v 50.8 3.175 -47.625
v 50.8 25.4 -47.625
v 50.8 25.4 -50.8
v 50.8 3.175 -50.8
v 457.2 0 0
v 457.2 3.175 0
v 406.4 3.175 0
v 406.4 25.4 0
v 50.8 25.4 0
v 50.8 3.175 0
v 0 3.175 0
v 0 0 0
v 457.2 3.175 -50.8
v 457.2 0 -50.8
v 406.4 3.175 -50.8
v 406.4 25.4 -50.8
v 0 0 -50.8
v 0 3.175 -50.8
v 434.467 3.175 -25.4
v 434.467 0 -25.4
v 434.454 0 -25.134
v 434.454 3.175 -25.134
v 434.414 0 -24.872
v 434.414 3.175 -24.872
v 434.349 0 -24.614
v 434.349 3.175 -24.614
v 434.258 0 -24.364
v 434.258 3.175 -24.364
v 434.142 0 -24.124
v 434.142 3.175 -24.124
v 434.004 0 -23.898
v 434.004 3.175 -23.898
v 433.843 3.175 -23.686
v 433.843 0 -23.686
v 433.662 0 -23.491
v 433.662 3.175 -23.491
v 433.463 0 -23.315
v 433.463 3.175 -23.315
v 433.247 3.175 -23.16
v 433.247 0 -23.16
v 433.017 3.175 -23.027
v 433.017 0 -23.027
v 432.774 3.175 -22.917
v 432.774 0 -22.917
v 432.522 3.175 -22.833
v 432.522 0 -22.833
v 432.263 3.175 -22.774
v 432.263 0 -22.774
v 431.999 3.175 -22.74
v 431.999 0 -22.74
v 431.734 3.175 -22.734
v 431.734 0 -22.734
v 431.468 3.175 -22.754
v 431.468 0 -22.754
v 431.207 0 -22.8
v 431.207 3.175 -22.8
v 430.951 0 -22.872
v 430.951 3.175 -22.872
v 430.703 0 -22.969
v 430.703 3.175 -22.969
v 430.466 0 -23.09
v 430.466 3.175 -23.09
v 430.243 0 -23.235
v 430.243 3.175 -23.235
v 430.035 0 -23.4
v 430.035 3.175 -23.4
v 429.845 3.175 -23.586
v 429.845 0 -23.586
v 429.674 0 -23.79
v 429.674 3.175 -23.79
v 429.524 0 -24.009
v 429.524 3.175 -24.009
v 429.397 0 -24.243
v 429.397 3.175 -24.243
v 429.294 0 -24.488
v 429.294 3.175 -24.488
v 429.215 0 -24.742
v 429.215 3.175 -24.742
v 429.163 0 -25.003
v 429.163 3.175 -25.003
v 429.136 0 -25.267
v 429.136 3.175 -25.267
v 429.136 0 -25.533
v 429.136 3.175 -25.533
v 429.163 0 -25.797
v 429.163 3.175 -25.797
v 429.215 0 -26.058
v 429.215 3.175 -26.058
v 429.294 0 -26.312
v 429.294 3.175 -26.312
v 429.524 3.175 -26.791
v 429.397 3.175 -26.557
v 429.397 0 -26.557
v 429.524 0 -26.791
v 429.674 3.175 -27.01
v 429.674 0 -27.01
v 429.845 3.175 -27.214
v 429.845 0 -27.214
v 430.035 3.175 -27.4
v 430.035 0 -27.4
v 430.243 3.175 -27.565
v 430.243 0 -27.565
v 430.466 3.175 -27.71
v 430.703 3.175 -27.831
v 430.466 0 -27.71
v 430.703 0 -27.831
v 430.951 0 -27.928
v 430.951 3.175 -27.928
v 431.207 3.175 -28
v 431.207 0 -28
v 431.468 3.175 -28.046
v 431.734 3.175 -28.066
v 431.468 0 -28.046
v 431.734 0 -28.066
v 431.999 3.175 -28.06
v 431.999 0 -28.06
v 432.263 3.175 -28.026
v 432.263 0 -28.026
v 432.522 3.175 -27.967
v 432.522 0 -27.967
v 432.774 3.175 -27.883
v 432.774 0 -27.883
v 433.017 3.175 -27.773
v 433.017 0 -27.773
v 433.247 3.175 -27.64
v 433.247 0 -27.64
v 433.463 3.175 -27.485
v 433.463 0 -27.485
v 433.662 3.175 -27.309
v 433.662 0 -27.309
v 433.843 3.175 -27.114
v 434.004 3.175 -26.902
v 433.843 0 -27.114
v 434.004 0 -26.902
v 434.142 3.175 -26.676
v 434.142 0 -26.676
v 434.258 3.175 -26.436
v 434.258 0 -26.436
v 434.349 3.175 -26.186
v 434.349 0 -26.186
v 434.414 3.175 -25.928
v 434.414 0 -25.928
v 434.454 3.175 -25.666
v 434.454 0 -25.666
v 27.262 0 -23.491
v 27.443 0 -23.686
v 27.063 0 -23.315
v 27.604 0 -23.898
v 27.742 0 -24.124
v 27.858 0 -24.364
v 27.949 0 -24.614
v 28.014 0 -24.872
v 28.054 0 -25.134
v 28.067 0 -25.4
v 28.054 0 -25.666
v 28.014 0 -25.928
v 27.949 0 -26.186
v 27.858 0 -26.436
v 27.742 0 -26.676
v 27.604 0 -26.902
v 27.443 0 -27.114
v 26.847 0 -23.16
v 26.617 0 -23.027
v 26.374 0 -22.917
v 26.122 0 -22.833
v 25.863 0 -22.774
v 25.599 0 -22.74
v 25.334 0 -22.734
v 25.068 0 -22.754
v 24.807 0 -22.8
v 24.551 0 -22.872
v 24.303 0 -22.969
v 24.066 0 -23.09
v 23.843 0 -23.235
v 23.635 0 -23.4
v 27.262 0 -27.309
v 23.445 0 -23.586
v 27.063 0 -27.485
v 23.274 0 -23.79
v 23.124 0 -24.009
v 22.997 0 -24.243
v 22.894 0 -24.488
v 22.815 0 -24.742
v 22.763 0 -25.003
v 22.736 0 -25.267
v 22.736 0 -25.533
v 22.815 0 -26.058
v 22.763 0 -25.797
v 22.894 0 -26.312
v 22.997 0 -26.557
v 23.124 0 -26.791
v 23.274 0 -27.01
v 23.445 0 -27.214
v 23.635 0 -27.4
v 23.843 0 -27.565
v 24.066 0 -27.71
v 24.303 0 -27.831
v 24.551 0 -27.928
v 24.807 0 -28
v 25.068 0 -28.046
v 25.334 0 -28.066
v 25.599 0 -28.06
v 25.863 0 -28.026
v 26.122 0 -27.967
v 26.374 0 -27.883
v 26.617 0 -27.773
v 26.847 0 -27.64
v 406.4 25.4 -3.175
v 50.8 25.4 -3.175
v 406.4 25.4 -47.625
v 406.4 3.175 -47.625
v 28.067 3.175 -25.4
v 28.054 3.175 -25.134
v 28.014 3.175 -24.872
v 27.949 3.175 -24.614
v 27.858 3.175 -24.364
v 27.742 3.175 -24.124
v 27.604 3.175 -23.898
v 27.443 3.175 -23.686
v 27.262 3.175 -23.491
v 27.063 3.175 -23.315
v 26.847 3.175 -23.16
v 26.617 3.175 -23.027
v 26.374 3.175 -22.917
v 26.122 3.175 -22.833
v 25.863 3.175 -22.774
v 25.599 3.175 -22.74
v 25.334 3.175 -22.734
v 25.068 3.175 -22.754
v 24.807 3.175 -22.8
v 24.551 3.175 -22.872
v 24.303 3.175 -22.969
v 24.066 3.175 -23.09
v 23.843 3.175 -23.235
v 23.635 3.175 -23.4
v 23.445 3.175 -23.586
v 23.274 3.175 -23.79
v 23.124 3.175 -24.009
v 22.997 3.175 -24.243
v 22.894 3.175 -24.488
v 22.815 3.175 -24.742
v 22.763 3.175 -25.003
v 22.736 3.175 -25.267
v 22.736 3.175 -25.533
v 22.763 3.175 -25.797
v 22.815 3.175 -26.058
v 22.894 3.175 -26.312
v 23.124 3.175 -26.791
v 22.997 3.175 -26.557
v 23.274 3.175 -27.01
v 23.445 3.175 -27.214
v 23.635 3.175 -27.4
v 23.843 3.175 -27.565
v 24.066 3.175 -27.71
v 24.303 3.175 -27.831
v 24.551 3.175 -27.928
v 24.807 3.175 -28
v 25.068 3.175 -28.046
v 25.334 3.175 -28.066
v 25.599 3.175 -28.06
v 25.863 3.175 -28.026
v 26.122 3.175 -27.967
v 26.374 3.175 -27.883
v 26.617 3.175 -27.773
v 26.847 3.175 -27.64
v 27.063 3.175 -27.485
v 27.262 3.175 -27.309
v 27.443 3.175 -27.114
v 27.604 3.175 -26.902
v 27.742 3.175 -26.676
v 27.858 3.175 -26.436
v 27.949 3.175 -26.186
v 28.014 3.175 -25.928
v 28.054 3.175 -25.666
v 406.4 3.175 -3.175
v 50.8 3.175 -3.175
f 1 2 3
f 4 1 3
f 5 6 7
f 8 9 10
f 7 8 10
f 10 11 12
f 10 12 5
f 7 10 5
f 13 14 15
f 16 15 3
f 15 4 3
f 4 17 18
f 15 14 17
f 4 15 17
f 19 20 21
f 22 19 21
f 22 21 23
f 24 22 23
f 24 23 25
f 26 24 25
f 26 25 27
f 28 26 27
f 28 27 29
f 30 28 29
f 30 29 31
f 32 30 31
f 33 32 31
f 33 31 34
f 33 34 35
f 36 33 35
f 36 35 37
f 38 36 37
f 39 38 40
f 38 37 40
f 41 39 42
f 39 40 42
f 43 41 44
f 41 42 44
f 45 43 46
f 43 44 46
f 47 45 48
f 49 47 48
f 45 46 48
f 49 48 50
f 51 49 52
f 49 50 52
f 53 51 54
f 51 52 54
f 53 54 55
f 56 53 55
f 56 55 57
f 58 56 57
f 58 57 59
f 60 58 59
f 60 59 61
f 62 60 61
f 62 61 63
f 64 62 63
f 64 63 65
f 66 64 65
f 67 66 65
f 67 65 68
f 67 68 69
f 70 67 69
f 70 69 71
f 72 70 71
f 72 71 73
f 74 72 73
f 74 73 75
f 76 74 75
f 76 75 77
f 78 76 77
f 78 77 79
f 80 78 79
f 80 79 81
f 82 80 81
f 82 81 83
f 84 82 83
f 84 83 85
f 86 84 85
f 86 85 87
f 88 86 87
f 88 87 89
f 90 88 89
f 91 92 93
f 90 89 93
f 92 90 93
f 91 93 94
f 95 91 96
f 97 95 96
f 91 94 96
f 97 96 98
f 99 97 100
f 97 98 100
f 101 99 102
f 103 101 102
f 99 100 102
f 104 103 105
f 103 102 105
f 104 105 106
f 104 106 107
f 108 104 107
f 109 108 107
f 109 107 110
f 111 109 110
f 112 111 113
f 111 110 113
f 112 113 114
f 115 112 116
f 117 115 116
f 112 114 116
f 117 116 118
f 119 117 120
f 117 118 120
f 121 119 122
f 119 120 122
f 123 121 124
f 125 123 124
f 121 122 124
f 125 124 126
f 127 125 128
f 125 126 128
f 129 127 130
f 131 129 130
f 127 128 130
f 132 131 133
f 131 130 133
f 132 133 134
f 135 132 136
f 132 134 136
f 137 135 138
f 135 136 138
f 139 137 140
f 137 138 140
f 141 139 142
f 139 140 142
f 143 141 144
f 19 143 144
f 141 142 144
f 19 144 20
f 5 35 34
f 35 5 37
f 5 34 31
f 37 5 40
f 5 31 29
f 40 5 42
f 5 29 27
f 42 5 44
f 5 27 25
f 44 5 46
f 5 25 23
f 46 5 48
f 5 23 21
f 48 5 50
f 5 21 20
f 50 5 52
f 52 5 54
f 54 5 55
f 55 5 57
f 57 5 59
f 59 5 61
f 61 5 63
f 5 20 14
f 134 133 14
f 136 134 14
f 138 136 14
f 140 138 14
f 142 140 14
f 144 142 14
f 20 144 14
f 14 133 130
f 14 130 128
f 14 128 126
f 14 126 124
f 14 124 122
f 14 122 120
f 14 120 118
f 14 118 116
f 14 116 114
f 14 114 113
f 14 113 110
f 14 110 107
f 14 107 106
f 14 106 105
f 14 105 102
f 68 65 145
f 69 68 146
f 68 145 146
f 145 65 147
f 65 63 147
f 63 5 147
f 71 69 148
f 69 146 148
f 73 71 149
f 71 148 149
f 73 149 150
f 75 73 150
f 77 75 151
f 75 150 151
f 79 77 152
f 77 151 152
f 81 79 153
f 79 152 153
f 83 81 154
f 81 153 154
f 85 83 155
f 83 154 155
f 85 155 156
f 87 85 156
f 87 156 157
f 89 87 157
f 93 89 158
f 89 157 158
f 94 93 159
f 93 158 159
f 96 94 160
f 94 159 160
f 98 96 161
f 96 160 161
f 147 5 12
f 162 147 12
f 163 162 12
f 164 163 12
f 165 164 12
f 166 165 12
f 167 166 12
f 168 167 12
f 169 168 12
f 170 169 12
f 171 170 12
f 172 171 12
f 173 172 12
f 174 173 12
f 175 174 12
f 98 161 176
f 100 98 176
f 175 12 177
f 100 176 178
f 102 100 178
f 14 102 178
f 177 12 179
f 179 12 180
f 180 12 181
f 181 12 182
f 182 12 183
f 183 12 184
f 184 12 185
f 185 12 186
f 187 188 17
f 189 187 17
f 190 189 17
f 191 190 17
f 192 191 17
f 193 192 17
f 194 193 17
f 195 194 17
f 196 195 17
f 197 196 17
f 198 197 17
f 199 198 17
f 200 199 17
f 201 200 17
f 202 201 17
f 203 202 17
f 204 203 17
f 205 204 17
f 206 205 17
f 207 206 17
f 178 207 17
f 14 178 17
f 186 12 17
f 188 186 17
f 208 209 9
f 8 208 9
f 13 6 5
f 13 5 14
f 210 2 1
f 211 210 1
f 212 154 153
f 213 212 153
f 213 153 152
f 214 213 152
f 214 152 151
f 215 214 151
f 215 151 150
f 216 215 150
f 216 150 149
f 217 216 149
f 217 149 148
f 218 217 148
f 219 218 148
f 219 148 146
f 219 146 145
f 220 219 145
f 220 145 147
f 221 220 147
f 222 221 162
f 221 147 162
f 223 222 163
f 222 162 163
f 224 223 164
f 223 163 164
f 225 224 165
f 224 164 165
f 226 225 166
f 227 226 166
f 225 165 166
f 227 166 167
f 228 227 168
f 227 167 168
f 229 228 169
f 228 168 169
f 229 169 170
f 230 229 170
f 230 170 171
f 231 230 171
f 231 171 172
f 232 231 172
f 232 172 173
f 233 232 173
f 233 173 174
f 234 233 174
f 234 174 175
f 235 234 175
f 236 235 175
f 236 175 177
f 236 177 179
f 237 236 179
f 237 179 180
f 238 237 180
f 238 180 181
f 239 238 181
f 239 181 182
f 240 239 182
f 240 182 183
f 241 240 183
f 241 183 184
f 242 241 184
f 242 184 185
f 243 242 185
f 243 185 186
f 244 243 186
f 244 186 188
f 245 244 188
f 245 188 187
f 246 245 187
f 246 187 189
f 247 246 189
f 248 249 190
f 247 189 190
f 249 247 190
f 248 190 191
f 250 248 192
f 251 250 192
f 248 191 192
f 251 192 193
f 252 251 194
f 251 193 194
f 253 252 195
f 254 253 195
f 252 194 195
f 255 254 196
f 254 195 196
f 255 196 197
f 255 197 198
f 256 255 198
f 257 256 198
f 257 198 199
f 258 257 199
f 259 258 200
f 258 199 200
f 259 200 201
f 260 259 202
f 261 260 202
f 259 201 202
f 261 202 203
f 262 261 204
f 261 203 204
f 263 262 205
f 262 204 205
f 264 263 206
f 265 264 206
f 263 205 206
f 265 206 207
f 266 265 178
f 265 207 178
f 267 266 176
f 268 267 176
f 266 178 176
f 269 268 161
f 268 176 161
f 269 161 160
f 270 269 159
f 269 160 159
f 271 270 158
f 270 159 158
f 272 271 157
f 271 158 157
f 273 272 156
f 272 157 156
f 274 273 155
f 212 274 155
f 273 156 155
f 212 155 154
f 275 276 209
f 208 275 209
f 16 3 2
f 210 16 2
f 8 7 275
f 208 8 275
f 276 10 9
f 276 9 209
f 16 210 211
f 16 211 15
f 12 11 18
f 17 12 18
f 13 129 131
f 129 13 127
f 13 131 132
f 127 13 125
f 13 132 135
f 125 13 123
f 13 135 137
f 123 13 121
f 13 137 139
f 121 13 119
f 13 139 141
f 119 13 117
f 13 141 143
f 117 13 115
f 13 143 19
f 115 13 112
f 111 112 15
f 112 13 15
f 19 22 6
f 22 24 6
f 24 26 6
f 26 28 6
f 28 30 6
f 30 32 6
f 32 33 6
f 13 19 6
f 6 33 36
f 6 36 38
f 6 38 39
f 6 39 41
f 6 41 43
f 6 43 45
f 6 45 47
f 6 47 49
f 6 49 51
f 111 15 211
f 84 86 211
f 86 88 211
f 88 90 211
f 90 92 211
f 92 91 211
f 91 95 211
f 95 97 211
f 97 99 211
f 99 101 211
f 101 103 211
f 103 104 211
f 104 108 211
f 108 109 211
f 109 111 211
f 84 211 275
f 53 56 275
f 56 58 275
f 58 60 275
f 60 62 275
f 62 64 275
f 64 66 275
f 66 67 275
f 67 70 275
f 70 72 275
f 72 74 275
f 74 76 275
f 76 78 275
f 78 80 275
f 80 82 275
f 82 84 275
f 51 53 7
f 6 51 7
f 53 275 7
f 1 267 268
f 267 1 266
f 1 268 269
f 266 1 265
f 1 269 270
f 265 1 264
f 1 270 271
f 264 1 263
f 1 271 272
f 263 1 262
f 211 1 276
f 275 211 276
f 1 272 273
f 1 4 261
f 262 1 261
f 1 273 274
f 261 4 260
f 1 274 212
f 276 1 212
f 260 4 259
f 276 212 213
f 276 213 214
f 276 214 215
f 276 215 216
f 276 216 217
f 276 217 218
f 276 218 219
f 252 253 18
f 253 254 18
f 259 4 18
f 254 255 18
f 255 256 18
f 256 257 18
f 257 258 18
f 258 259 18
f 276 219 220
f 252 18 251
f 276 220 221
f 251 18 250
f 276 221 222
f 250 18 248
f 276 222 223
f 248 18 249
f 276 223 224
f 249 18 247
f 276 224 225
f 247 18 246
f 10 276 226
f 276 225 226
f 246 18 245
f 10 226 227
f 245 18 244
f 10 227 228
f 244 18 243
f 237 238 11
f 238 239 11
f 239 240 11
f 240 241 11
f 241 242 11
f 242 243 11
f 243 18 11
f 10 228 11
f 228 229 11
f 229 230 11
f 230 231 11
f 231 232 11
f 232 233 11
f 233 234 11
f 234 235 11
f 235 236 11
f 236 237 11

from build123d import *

# Parameters (mm, degrees)
BOSS_EXTRUDE1_DEPTH = 457.2
SKETCH2_W           = 50.8
SKETCH2_H           = 50.8
CUT_EXTRUDE1_DEPTH  = 22.225
CUT_EXTRUDE2_REACH  = 27.4
SKETCH3_R           = 2.667


with BuildPart() as part:
    # Sketch1 → Boss-Extrude1 (new body)
    with BuildSketch(Plane(origin=(0, 0, 0), x_dir=(0, 0, -1), z_dir=(1, 0, 0))):
        Polygon((3.175, 3.175), (3.175, 25.4), (0, 25.4), (0, 0), (50.8, 0), (50.8, 25.4), (47.625, 25.4), (47.625, 3.175), align=None)
    extrude(amount=BOSS_EXTRUDE1_DEPTH)

    # Sketch2 → Cut-Extrude1 (cut)
    with BuildSketch(Plane(origin=(0, 25.4, 0), x_dir=(1, 0, 0), z_dir=(0, 1, 0))):
        with Locations((25.4, 25.4)):
            Rectangle(SKETCH2_W, SKETCH2_H)
        with Locations((431.8, 25.4)):
            Rectangle(SKETCH2_W, SKETCH2_H)
    extrude(amount=-CUT_EXTRUDE1_DEPTH, mode=Mode.SUBTRACT)

    # Sketch3 → Cut-Extrude2 (cut, up to next)
    with BuildSketch(Plane.XZ, mode=Mode.PRIVATE) as cut_extrude2_sk1:
        with Locations((25.4, -25.4)):
            Circle(SKETCH3_R)
    cut_extrude2_tool1 = extrude(cut_extrude2_sk1.sketch, amount=-CUT_EXTRUDE2_REACH, mode=Mode.PRIVATE) & part.part
    add(cut_extrude2_tool1.solids().sort_by_distance((25.4, 0, -25.4))[0], mode=Mode.SUBTRACT)
    # Sketch3 → Cut-Extrude2 (cut, up to next)
    with BuildSketch(Plane.XZ, mode=Mode.PRIVATE) as cut_extrude2_sk2:
        with Locations((431.8, -25.4)):
            Circle(SKETCH3_R)
    cut_extrude2_tool2 = extrude(cut_extrude2_sk2.sketch, amount=-CUT_EXTRUDE2_REACH, mode=Mode.PRIVATE) & part.part
    add(cut_extrude2_tool2.solids().sort_by_distance((431.8, 0, -25.4))[0], mode=Mode.SUBTRACT)


solid = part.part
